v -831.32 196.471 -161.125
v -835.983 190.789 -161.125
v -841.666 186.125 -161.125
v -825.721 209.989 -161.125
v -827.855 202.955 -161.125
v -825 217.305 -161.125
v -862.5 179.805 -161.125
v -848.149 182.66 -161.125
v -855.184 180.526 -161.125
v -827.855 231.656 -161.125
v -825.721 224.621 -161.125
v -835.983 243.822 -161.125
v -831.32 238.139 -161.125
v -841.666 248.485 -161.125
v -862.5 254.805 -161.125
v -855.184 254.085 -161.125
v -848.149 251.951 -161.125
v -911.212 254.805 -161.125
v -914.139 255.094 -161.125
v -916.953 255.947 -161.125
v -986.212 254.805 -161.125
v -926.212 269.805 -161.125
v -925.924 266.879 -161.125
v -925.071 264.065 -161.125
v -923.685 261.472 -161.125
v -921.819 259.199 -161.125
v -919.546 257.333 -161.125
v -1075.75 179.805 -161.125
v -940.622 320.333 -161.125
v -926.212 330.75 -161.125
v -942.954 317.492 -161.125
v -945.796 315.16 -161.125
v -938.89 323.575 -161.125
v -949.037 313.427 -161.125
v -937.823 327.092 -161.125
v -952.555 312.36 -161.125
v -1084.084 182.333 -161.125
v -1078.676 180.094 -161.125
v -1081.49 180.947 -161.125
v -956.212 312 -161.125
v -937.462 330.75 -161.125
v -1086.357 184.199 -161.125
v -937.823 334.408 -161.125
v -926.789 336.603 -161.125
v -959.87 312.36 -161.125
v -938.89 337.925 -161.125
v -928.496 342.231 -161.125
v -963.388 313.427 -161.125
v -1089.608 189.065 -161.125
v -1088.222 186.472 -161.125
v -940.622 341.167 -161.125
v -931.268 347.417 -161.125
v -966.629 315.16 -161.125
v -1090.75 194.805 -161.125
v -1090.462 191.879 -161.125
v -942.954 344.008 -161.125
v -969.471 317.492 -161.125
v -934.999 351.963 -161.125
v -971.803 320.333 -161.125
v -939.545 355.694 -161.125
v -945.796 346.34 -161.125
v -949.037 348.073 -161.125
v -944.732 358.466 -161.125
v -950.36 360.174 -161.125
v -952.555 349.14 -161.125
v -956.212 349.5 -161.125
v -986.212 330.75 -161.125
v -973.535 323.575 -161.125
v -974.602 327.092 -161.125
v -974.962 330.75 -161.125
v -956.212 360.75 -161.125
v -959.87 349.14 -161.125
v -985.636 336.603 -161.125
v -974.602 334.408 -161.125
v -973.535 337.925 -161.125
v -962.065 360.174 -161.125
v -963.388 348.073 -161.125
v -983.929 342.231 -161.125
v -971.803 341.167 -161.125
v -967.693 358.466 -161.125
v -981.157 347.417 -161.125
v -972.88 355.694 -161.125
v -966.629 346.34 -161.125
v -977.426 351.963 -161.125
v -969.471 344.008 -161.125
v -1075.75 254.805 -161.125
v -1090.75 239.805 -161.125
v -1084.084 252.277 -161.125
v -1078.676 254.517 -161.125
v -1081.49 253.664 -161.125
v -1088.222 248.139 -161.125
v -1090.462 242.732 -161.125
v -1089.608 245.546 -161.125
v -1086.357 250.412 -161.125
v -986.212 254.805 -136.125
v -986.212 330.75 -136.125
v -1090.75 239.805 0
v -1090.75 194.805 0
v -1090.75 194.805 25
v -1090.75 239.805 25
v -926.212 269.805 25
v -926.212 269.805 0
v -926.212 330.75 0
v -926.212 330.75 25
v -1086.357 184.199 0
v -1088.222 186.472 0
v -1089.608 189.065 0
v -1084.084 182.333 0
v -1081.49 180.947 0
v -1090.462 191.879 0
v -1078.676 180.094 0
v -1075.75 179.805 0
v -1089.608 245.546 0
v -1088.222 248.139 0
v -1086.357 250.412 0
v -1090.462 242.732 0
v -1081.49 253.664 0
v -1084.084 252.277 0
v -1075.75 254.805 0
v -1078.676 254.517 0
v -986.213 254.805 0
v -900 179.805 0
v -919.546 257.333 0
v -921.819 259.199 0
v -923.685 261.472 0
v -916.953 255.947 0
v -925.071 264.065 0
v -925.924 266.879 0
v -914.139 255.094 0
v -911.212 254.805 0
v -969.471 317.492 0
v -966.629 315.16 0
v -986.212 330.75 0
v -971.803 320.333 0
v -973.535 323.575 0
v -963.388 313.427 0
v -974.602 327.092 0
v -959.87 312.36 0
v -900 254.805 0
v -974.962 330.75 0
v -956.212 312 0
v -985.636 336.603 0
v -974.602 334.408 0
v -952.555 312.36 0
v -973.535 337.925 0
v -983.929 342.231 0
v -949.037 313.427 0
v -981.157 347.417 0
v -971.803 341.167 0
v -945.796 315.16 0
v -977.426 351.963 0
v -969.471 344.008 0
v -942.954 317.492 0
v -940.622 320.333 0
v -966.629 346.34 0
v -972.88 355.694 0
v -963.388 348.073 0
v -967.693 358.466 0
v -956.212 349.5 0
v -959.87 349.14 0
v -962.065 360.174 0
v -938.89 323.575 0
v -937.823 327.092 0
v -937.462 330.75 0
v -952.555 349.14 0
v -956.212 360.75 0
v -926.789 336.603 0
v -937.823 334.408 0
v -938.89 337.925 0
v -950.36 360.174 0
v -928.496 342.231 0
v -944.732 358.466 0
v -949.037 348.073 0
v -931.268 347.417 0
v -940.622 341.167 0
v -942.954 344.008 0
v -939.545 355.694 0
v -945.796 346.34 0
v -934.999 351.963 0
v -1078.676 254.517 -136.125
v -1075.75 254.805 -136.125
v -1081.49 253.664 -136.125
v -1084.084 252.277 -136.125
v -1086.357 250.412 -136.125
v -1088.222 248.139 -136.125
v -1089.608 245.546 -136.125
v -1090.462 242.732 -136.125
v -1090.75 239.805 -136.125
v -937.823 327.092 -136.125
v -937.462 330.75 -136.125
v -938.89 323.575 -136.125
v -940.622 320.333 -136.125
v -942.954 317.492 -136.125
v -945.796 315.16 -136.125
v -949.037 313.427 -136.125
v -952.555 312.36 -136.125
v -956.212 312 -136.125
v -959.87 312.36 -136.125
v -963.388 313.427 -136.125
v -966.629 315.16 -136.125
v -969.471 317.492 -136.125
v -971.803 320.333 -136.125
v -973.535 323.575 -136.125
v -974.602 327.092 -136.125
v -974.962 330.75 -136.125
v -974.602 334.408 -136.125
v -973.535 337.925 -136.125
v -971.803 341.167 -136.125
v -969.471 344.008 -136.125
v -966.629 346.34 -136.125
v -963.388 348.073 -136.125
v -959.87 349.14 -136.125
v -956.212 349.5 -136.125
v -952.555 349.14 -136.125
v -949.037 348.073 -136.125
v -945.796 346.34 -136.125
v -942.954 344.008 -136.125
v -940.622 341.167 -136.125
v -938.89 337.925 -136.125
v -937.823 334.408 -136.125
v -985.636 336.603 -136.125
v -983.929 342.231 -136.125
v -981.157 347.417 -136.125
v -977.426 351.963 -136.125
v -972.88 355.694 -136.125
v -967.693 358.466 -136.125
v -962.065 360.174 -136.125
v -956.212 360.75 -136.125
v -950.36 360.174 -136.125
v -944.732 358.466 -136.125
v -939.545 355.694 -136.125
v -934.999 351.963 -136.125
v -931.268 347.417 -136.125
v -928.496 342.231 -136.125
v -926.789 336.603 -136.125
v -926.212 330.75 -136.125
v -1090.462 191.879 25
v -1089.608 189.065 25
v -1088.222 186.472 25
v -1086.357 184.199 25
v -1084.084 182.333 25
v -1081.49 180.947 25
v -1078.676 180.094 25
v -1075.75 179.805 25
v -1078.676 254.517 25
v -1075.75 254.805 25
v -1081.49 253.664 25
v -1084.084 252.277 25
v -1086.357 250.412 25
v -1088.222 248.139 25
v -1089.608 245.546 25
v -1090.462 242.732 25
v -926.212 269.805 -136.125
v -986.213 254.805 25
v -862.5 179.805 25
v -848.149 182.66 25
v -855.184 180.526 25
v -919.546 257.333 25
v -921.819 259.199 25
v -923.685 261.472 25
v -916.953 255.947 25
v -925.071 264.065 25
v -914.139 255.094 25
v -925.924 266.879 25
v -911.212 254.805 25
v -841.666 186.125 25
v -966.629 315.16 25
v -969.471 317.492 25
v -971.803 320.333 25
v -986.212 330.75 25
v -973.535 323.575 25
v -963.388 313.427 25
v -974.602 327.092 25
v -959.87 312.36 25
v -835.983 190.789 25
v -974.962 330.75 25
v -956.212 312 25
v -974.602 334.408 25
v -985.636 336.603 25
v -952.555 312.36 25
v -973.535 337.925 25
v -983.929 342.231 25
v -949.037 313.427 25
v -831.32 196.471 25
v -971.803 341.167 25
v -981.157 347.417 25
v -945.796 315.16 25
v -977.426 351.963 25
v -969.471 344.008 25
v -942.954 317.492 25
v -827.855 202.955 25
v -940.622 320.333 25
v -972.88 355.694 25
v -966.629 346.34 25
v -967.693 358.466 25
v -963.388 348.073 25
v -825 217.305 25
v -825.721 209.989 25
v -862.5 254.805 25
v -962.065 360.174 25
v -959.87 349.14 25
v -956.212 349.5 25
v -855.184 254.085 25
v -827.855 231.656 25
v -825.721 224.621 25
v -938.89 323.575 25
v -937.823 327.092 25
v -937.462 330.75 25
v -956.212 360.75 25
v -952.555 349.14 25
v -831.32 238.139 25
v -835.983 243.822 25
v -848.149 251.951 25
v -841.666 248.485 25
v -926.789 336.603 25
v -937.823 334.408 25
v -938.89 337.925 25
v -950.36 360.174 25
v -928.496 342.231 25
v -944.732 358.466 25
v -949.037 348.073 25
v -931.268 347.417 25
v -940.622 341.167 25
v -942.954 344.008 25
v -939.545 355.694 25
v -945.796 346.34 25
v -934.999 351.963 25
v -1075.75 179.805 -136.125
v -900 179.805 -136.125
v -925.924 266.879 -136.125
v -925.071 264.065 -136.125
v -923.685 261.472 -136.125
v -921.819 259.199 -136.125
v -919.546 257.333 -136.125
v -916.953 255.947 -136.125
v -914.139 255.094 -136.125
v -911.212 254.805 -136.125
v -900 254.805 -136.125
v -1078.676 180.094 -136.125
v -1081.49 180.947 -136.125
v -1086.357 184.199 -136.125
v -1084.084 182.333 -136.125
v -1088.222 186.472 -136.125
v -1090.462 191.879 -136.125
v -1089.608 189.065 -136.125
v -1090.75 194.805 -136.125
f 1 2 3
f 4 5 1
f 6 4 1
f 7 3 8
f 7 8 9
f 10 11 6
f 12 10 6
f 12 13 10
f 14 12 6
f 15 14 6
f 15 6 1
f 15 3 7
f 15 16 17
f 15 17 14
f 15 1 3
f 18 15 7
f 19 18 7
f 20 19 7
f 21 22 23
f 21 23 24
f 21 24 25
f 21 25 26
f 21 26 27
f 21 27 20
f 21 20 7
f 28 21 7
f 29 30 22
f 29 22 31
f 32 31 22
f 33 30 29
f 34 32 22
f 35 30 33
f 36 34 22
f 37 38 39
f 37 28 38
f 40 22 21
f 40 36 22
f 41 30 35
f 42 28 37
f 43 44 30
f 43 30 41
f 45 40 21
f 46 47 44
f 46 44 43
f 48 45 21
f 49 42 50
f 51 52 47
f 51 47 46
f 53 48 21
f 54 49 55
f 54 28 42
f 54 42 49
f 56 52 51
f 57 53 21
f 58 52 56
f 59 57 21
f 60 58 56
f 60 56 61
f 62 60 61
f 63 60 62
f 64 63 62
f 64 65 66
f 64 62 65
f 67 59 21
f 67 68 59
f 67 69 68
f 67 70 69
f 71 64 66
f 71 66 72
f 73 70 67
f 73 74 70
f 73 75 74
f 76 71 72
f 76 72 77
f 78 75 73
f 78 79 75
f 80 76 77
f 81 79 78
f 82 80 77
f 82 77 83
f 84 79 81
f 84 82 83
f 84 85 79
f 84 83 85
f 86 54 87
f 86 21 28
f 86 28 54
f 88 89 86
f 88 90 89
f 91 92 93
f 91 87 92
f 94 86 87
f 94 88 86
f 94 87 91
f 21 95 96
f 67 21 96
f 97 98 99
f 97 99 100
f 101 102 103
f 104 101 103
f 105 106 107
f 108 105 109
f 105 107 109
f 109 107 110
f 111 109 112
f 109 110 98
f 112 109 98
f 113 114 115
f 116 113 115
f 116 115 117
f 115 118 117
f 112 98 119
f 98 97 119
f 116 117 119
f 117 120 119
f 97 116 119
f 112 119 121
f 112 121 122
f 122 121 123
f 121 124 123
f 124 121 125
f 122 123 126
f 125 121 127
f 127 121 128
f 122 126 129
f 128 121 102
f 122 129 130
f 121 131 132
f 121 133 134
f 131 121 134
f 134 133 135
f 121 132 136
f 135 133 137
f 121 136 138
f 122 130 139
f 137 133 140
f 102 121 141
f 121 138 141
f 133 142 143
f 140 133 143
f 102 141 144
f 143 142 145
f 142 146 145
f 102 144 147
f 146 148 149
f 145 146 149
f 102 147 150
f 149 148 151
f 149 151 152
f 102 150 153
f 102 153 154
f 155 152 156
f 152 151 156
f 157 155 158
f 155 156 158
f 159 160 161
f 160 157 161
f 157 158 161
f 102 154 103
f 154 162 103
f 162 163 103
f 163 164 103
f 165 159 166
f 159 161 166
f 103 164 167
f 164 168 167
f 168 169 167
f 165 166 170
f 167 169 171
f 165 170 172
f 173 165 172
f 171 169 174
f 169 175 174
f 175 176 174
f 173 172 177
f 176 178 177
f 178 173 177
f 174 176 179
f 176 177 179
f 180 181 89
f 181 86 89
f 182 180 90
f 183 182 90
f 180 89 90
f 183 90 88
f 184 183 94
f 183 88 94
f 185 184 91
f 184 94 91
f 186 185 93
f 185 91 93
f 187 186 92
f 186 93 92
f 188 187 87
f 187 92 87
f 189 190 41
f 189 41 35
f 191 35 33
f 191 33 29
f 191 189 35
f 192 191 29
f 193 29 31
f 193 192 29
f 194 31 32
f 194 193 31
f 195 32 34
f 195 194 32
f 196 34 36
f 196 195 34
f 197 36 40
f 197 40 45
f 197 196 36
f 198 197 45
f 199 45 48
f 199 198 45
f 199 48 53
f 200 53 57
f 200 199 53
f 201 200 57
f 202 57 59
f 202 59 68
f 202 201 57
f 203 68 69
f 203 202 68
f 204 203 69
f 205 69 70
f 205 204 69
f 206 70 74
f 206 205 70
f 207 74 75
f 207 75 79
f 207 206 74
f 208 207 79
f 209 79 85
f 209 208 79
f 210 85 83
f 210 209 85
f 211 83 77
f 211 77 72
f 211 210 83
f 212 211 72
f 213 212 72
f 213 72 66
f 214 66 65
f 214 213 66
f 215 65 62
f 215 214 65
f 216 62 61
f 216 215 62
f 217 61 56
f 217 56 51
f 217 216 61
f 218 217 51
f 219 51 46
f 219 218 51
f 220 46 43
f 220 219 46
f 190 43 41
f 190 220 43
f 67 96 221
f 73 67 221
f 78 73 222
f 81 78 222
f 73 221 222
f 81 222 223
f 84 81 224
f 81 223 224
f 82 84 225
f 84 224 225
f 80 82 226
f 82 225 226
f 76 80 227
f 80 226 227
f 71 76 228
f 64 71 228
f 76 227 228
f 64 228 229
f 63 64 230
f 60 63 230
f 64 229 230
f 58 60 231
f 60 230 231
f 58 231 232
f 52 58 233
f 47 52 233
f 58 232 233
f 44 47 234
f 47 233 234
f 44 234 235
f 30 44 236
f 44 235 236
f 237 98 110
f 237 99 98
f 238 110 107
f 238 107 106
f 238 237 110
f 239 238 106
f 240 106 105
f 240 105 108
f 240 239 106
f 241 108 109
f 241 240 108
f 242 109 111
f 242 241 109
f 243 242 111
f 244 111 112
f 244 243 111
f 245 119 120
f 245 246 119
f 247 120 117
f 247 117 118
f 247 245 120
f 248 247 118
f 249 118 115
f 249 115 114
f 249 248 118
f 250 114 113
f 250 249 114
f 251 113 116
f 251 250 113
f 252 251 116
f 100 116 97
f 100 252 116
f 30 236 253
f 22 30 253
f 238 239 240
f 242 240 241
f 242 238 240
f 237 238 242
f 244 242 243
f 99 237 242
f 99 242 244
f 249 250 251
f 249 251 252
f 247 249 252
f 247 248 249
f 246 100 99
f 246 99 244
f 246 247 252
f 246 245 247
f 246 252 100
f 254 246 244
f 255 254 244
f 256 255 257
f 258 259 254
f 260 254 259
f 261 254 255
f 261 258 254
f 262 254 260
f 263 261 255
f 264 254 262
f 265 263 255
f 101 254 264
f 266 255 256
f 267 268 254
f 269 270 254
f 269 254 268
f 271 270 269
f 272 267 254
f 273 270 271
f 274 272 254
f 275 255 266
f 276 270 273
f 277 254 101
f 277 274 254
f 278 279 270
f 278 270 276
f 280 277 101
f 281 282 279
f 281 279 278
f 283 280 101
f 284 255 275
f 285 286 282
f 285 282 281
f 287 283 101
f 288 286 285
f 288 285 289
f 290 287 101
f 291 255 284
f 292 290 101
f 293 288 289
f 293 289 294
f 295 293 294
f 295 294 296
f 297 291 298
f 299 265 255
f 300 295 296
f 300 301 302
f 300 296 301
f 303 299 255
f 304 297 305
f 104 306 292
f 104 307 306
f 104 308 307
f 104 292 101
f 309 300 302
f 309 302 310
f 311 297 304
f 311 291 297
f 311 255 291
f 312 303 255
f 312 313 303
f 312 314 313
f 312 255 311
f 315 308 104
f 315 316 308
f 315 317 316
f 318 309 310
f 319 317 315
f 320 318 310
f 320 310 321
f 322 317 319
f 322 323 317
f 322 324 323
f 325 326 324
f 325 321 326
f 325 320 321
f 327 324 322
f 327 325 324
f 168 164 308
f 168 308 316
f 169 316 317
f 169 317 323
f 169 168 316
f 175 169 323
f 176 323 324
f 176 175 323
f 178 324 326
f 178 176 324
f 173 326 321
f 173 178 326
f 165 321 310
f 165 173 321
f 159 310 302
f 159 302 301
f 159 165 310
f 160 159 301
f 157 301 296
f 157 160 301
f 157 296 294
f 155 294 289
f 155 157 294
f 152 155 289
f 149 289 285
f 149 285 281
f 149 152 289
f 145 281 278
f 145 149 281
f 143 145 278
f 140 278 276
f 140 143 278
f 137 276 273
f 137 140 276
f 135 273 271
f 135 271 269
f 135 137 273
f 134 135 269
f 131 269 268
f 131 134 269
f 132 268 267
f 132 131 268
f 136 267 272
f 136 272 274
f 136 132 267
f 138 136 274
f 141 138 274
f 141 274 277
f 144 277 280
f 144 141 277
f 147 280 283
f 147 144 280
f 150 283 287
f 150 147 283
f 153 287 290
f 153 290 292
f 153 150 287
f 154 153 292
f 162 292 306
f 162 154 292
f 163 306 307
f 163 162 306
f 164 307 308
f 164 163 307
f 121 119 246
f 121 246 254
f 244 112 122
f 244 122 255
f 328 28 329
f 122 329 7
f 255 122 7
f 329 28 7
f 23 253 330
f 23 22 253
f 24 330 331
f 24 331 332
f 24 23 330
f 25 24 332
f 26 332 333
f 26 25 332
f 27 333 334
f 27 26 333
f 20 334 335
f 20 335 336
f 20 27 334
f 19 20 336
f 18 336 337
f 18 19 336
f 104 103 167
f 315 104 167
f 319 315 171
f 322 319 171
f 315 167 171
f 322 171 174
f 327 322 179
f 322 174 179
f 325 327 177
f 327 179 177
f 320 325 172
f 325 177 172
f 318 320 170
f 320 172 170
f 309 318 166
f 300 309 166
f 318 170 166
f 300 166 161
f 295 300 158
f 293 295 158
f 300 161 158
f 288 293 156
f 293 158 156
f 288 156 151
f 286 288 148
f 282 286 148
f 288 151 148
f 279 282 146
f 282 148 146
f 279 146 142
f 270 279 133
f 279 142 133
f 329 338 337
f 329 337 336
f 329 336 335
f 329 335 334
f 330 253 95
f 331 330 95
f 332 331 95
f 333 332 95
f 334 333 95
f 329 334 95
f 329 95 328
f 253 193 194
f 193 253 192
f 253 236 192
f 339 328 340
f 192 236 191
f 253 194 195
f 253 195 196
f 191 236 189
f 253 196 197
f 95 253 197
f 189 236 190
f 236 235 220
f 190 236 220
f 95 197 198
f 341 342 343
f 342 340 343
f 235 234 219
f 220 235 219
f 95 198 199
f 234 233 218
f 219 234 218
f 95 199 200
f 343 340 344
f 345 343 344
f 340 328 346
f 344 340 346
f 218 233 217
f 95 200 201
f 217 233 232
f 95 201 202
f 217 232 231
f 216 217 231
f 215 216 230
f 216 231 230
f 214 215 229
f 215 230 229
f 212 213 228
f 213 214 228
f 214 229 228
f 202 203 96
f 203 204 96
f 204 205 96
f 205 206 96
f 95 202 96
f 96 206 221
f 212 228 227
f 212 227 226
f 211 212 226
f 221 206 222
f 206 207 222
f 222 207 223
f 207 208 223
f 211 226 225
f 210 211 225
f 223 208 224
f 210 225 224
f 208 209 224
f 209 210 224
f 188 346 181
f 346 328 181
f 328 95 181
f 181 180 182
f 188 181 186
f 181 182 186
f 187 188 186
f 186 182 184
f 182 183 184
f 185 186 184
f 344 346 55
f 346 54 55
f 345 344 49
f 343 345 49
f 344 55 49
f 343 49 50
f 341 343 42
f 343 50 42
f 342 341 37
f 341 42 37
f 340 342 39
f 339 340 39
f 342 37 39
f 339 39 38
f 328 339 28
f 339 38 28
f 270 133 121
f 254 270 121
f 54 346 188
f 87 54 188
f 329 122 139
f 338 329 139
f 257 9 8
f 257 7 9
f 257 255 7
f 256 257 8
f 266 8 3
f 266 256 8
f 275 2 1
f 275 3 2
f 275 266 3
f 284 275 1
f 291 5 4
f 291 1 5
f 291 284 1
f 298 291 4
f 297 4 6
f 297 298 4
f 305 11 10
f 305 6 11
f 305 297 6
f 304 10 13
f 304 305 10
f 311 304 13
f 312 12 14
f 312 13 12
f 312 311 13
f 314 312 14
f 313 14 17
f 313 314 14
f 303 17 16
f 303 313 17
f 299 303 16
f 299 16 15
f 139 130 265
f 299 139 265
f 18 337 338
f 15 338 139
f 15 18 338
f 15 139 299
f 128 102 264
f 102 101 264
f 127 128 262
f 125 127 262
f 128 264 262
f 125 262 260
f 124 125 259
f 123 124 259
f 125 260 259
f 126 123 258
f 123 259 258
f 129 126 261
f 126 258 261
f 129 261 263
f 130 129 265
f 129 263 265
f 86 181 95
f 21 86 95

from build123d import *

# Parameters (mm, degrees)
SKETCH1_R           = 18.75
SKETCH1_W           = 104.5375
SKETCH1_H           = 75
BOSS_EXTRUDE1_DEPTH = 25
SKETCH2_R           = 18.75
BOSS_EXTRUDE2_DEPTH = 25
SKETCH3_W           = 75
SKETCH3_H           = 75
BOSS_EXTRUDE3_DEPTH = 136.125
FILLET1_RADIUS      = 37.5
FILLET1_LENGTH      = 186.125
FILLET2_R           = 15


with BuildPart() as part:
    # Sketch1 → Boss-Extrude1 (new body)
    # profile 1 of 3: a face of its own
    with BuildSketch(Plane.XY):
        with BuildLine():
            Line((-986.2125, 179.805377859), (-825, 179.805377859))
            Line((-825, 179.805377859), (-825, 254.805377859))
            Line((-825, 254.805377859), (-926.2125, 254.805377859))
            Line((-926.2125, 254.805377859), (-926.2125, 330.75))
            ThreePointArc((-926.2125, 330.75), (-956.2125, 360.75), (-986.2125, 330.75))
            Line((-986.2125, 330.75), (-986.2125, 254.805377859))
            Line((-986.2125, 254.805377859), (-986.2125, 179.805377859))
        make_face()
        with Locations((-956.2125, 330.75)):
            Circle(SKETCH1_R, mode=Mode.SUBTRACT)
    # profile 2 of 3: a face of its own
    with BuildSketch(Plane.XY):
        with BuildLine():
            Line((-986.2125, 179.805377859), (-825, 179.805377859))
            Line((-825, 179.805377859), (-825, 254.805377859))
            Line((-825, 254.805377859), (-926.2125, 254.805377859))
            Line((-926.2125, 254.805377859), (-926.2125, 330.75))
            ThreePointArc((-926.2125, 330.75), (-956.2125, 360.75), (-986.2125, 330.75))
            Line((-986.2125, 330.75), (-986.2125, 254.805377859))
            Line((-986.2125, 254.805377859), (-986.2125, 179.805377859))
        make_face()
        with Locations((-956.2125, 330.75)):
            Circle(SKETCH1_R, mode=Mode.SUBTRACT)
    # profile 3 of 3: a face of its own
    with BuildSketch(Plane.XY):
        with Locations((-1038.48125, 217.305377859)):
            Rectangle(SKETCH1_W, SKETCH1_H)
    extrude(amount=BOSS_EXTRUDE1_DEPTH)



with BuildPart() as body_2:
    # Sketch2 → Boss-Extrude2 (new body)
    with BuildSketch(Plane(origin=(0, 0, -136.125), x_dir=(-1, 0, 0), z_dir=(0, 0, -1))):
        with BuildLine():
            Line((926.2125, 330.75), (926.2125, 254.805377859))
            Line((926.2125, 254.805377859), (825, 254.805377859))
            Line((825, 254.805377859), (825, 179.805377859))
            Line((825, 179.805377859), (1090.75, 179.805377859))
            Line((1090.75, 179.805377859), (1090.75, 254.805377859))
            Line((1090.75, 254.805377859), (986.2125, 254.805377859))
            Line((986.2125, 254.805377859), (986.2125, 330.75))
            ThreePointArc((986.2125, 330.75), (956.2125, 360.75), (926.2125, 330.75))
        make_face()
        with Locations(Location((956.2125, 330.75, 0), (0, 0, 180))):
            Circle(SKETCH2_R, mode=Mode.SUBTRACT)
    extrude(amount=BOSS_EXTRUDE2_DEPTH)


with BuildPart() as part_1:
    add(part.part)

    add(body_2.part)  # Boss-Extrude3 merges body 2
    # Sketch3 → Boss-Extrude3 (add)
    with BuildSketch(Plane.XY.offset(-136.125)):
        with Locations((-862.5, 217.305377859)):
            Rectangle(SKETCH3_W, SKETCH3_H)
    extrude(amount=BOSS_EXTRUDE3_DEPTH)

    # Fillet1: full round fillet: the end face becomes a half cylinder, R = half its width
    fillet1_face = Plane((-825, 217.305377859, -68.0625), x_dir=(0, 0, 1), z_dir=(1, 0, 0))  # on the end face: x along it, z out of the body
    fillet1_slab = fillet1_face.offset(-FILLET1_RADIUS / 2) * Box(FILLET1_LENGTH, 2 * FILLET1_RADIUS, FILLET1_RADIUS, mode=Mode.PRIVATE)  # the body's end, R deep
    fillet1_round = Plane((-862.5, 217.305377859, -68.0625), x_dir=(1, 0, 0), z_dir=(0, 0, 1)) * Cylinder(FILLET1_RADIUS, FILLET1_LENGTH, mode=Mode.PRIVATE)  # its axis R under the face
    add(fillet1_slab - fillet1_round, mode=Mode.SUBTRACT)

    # Fillet2
    fillet2_edges = [part_1.edges().sort_by_distance(p)[0] for p in [
        (-926.2125, 254.805377859, 12.5),
        (-1090.75, 179.805377859, 12.5),
        (-1090.75, 254.805377859, 12.5),
        (-926.2125, 254.805377859, -148.625),
        (-1090.75, 179.805377859, -148.625),
        (-1090.75, 254.805377859, -148.625),
    ]]
    fillet(fillet2_edges, radius=FILLET2_R)


solid = part_1.part
